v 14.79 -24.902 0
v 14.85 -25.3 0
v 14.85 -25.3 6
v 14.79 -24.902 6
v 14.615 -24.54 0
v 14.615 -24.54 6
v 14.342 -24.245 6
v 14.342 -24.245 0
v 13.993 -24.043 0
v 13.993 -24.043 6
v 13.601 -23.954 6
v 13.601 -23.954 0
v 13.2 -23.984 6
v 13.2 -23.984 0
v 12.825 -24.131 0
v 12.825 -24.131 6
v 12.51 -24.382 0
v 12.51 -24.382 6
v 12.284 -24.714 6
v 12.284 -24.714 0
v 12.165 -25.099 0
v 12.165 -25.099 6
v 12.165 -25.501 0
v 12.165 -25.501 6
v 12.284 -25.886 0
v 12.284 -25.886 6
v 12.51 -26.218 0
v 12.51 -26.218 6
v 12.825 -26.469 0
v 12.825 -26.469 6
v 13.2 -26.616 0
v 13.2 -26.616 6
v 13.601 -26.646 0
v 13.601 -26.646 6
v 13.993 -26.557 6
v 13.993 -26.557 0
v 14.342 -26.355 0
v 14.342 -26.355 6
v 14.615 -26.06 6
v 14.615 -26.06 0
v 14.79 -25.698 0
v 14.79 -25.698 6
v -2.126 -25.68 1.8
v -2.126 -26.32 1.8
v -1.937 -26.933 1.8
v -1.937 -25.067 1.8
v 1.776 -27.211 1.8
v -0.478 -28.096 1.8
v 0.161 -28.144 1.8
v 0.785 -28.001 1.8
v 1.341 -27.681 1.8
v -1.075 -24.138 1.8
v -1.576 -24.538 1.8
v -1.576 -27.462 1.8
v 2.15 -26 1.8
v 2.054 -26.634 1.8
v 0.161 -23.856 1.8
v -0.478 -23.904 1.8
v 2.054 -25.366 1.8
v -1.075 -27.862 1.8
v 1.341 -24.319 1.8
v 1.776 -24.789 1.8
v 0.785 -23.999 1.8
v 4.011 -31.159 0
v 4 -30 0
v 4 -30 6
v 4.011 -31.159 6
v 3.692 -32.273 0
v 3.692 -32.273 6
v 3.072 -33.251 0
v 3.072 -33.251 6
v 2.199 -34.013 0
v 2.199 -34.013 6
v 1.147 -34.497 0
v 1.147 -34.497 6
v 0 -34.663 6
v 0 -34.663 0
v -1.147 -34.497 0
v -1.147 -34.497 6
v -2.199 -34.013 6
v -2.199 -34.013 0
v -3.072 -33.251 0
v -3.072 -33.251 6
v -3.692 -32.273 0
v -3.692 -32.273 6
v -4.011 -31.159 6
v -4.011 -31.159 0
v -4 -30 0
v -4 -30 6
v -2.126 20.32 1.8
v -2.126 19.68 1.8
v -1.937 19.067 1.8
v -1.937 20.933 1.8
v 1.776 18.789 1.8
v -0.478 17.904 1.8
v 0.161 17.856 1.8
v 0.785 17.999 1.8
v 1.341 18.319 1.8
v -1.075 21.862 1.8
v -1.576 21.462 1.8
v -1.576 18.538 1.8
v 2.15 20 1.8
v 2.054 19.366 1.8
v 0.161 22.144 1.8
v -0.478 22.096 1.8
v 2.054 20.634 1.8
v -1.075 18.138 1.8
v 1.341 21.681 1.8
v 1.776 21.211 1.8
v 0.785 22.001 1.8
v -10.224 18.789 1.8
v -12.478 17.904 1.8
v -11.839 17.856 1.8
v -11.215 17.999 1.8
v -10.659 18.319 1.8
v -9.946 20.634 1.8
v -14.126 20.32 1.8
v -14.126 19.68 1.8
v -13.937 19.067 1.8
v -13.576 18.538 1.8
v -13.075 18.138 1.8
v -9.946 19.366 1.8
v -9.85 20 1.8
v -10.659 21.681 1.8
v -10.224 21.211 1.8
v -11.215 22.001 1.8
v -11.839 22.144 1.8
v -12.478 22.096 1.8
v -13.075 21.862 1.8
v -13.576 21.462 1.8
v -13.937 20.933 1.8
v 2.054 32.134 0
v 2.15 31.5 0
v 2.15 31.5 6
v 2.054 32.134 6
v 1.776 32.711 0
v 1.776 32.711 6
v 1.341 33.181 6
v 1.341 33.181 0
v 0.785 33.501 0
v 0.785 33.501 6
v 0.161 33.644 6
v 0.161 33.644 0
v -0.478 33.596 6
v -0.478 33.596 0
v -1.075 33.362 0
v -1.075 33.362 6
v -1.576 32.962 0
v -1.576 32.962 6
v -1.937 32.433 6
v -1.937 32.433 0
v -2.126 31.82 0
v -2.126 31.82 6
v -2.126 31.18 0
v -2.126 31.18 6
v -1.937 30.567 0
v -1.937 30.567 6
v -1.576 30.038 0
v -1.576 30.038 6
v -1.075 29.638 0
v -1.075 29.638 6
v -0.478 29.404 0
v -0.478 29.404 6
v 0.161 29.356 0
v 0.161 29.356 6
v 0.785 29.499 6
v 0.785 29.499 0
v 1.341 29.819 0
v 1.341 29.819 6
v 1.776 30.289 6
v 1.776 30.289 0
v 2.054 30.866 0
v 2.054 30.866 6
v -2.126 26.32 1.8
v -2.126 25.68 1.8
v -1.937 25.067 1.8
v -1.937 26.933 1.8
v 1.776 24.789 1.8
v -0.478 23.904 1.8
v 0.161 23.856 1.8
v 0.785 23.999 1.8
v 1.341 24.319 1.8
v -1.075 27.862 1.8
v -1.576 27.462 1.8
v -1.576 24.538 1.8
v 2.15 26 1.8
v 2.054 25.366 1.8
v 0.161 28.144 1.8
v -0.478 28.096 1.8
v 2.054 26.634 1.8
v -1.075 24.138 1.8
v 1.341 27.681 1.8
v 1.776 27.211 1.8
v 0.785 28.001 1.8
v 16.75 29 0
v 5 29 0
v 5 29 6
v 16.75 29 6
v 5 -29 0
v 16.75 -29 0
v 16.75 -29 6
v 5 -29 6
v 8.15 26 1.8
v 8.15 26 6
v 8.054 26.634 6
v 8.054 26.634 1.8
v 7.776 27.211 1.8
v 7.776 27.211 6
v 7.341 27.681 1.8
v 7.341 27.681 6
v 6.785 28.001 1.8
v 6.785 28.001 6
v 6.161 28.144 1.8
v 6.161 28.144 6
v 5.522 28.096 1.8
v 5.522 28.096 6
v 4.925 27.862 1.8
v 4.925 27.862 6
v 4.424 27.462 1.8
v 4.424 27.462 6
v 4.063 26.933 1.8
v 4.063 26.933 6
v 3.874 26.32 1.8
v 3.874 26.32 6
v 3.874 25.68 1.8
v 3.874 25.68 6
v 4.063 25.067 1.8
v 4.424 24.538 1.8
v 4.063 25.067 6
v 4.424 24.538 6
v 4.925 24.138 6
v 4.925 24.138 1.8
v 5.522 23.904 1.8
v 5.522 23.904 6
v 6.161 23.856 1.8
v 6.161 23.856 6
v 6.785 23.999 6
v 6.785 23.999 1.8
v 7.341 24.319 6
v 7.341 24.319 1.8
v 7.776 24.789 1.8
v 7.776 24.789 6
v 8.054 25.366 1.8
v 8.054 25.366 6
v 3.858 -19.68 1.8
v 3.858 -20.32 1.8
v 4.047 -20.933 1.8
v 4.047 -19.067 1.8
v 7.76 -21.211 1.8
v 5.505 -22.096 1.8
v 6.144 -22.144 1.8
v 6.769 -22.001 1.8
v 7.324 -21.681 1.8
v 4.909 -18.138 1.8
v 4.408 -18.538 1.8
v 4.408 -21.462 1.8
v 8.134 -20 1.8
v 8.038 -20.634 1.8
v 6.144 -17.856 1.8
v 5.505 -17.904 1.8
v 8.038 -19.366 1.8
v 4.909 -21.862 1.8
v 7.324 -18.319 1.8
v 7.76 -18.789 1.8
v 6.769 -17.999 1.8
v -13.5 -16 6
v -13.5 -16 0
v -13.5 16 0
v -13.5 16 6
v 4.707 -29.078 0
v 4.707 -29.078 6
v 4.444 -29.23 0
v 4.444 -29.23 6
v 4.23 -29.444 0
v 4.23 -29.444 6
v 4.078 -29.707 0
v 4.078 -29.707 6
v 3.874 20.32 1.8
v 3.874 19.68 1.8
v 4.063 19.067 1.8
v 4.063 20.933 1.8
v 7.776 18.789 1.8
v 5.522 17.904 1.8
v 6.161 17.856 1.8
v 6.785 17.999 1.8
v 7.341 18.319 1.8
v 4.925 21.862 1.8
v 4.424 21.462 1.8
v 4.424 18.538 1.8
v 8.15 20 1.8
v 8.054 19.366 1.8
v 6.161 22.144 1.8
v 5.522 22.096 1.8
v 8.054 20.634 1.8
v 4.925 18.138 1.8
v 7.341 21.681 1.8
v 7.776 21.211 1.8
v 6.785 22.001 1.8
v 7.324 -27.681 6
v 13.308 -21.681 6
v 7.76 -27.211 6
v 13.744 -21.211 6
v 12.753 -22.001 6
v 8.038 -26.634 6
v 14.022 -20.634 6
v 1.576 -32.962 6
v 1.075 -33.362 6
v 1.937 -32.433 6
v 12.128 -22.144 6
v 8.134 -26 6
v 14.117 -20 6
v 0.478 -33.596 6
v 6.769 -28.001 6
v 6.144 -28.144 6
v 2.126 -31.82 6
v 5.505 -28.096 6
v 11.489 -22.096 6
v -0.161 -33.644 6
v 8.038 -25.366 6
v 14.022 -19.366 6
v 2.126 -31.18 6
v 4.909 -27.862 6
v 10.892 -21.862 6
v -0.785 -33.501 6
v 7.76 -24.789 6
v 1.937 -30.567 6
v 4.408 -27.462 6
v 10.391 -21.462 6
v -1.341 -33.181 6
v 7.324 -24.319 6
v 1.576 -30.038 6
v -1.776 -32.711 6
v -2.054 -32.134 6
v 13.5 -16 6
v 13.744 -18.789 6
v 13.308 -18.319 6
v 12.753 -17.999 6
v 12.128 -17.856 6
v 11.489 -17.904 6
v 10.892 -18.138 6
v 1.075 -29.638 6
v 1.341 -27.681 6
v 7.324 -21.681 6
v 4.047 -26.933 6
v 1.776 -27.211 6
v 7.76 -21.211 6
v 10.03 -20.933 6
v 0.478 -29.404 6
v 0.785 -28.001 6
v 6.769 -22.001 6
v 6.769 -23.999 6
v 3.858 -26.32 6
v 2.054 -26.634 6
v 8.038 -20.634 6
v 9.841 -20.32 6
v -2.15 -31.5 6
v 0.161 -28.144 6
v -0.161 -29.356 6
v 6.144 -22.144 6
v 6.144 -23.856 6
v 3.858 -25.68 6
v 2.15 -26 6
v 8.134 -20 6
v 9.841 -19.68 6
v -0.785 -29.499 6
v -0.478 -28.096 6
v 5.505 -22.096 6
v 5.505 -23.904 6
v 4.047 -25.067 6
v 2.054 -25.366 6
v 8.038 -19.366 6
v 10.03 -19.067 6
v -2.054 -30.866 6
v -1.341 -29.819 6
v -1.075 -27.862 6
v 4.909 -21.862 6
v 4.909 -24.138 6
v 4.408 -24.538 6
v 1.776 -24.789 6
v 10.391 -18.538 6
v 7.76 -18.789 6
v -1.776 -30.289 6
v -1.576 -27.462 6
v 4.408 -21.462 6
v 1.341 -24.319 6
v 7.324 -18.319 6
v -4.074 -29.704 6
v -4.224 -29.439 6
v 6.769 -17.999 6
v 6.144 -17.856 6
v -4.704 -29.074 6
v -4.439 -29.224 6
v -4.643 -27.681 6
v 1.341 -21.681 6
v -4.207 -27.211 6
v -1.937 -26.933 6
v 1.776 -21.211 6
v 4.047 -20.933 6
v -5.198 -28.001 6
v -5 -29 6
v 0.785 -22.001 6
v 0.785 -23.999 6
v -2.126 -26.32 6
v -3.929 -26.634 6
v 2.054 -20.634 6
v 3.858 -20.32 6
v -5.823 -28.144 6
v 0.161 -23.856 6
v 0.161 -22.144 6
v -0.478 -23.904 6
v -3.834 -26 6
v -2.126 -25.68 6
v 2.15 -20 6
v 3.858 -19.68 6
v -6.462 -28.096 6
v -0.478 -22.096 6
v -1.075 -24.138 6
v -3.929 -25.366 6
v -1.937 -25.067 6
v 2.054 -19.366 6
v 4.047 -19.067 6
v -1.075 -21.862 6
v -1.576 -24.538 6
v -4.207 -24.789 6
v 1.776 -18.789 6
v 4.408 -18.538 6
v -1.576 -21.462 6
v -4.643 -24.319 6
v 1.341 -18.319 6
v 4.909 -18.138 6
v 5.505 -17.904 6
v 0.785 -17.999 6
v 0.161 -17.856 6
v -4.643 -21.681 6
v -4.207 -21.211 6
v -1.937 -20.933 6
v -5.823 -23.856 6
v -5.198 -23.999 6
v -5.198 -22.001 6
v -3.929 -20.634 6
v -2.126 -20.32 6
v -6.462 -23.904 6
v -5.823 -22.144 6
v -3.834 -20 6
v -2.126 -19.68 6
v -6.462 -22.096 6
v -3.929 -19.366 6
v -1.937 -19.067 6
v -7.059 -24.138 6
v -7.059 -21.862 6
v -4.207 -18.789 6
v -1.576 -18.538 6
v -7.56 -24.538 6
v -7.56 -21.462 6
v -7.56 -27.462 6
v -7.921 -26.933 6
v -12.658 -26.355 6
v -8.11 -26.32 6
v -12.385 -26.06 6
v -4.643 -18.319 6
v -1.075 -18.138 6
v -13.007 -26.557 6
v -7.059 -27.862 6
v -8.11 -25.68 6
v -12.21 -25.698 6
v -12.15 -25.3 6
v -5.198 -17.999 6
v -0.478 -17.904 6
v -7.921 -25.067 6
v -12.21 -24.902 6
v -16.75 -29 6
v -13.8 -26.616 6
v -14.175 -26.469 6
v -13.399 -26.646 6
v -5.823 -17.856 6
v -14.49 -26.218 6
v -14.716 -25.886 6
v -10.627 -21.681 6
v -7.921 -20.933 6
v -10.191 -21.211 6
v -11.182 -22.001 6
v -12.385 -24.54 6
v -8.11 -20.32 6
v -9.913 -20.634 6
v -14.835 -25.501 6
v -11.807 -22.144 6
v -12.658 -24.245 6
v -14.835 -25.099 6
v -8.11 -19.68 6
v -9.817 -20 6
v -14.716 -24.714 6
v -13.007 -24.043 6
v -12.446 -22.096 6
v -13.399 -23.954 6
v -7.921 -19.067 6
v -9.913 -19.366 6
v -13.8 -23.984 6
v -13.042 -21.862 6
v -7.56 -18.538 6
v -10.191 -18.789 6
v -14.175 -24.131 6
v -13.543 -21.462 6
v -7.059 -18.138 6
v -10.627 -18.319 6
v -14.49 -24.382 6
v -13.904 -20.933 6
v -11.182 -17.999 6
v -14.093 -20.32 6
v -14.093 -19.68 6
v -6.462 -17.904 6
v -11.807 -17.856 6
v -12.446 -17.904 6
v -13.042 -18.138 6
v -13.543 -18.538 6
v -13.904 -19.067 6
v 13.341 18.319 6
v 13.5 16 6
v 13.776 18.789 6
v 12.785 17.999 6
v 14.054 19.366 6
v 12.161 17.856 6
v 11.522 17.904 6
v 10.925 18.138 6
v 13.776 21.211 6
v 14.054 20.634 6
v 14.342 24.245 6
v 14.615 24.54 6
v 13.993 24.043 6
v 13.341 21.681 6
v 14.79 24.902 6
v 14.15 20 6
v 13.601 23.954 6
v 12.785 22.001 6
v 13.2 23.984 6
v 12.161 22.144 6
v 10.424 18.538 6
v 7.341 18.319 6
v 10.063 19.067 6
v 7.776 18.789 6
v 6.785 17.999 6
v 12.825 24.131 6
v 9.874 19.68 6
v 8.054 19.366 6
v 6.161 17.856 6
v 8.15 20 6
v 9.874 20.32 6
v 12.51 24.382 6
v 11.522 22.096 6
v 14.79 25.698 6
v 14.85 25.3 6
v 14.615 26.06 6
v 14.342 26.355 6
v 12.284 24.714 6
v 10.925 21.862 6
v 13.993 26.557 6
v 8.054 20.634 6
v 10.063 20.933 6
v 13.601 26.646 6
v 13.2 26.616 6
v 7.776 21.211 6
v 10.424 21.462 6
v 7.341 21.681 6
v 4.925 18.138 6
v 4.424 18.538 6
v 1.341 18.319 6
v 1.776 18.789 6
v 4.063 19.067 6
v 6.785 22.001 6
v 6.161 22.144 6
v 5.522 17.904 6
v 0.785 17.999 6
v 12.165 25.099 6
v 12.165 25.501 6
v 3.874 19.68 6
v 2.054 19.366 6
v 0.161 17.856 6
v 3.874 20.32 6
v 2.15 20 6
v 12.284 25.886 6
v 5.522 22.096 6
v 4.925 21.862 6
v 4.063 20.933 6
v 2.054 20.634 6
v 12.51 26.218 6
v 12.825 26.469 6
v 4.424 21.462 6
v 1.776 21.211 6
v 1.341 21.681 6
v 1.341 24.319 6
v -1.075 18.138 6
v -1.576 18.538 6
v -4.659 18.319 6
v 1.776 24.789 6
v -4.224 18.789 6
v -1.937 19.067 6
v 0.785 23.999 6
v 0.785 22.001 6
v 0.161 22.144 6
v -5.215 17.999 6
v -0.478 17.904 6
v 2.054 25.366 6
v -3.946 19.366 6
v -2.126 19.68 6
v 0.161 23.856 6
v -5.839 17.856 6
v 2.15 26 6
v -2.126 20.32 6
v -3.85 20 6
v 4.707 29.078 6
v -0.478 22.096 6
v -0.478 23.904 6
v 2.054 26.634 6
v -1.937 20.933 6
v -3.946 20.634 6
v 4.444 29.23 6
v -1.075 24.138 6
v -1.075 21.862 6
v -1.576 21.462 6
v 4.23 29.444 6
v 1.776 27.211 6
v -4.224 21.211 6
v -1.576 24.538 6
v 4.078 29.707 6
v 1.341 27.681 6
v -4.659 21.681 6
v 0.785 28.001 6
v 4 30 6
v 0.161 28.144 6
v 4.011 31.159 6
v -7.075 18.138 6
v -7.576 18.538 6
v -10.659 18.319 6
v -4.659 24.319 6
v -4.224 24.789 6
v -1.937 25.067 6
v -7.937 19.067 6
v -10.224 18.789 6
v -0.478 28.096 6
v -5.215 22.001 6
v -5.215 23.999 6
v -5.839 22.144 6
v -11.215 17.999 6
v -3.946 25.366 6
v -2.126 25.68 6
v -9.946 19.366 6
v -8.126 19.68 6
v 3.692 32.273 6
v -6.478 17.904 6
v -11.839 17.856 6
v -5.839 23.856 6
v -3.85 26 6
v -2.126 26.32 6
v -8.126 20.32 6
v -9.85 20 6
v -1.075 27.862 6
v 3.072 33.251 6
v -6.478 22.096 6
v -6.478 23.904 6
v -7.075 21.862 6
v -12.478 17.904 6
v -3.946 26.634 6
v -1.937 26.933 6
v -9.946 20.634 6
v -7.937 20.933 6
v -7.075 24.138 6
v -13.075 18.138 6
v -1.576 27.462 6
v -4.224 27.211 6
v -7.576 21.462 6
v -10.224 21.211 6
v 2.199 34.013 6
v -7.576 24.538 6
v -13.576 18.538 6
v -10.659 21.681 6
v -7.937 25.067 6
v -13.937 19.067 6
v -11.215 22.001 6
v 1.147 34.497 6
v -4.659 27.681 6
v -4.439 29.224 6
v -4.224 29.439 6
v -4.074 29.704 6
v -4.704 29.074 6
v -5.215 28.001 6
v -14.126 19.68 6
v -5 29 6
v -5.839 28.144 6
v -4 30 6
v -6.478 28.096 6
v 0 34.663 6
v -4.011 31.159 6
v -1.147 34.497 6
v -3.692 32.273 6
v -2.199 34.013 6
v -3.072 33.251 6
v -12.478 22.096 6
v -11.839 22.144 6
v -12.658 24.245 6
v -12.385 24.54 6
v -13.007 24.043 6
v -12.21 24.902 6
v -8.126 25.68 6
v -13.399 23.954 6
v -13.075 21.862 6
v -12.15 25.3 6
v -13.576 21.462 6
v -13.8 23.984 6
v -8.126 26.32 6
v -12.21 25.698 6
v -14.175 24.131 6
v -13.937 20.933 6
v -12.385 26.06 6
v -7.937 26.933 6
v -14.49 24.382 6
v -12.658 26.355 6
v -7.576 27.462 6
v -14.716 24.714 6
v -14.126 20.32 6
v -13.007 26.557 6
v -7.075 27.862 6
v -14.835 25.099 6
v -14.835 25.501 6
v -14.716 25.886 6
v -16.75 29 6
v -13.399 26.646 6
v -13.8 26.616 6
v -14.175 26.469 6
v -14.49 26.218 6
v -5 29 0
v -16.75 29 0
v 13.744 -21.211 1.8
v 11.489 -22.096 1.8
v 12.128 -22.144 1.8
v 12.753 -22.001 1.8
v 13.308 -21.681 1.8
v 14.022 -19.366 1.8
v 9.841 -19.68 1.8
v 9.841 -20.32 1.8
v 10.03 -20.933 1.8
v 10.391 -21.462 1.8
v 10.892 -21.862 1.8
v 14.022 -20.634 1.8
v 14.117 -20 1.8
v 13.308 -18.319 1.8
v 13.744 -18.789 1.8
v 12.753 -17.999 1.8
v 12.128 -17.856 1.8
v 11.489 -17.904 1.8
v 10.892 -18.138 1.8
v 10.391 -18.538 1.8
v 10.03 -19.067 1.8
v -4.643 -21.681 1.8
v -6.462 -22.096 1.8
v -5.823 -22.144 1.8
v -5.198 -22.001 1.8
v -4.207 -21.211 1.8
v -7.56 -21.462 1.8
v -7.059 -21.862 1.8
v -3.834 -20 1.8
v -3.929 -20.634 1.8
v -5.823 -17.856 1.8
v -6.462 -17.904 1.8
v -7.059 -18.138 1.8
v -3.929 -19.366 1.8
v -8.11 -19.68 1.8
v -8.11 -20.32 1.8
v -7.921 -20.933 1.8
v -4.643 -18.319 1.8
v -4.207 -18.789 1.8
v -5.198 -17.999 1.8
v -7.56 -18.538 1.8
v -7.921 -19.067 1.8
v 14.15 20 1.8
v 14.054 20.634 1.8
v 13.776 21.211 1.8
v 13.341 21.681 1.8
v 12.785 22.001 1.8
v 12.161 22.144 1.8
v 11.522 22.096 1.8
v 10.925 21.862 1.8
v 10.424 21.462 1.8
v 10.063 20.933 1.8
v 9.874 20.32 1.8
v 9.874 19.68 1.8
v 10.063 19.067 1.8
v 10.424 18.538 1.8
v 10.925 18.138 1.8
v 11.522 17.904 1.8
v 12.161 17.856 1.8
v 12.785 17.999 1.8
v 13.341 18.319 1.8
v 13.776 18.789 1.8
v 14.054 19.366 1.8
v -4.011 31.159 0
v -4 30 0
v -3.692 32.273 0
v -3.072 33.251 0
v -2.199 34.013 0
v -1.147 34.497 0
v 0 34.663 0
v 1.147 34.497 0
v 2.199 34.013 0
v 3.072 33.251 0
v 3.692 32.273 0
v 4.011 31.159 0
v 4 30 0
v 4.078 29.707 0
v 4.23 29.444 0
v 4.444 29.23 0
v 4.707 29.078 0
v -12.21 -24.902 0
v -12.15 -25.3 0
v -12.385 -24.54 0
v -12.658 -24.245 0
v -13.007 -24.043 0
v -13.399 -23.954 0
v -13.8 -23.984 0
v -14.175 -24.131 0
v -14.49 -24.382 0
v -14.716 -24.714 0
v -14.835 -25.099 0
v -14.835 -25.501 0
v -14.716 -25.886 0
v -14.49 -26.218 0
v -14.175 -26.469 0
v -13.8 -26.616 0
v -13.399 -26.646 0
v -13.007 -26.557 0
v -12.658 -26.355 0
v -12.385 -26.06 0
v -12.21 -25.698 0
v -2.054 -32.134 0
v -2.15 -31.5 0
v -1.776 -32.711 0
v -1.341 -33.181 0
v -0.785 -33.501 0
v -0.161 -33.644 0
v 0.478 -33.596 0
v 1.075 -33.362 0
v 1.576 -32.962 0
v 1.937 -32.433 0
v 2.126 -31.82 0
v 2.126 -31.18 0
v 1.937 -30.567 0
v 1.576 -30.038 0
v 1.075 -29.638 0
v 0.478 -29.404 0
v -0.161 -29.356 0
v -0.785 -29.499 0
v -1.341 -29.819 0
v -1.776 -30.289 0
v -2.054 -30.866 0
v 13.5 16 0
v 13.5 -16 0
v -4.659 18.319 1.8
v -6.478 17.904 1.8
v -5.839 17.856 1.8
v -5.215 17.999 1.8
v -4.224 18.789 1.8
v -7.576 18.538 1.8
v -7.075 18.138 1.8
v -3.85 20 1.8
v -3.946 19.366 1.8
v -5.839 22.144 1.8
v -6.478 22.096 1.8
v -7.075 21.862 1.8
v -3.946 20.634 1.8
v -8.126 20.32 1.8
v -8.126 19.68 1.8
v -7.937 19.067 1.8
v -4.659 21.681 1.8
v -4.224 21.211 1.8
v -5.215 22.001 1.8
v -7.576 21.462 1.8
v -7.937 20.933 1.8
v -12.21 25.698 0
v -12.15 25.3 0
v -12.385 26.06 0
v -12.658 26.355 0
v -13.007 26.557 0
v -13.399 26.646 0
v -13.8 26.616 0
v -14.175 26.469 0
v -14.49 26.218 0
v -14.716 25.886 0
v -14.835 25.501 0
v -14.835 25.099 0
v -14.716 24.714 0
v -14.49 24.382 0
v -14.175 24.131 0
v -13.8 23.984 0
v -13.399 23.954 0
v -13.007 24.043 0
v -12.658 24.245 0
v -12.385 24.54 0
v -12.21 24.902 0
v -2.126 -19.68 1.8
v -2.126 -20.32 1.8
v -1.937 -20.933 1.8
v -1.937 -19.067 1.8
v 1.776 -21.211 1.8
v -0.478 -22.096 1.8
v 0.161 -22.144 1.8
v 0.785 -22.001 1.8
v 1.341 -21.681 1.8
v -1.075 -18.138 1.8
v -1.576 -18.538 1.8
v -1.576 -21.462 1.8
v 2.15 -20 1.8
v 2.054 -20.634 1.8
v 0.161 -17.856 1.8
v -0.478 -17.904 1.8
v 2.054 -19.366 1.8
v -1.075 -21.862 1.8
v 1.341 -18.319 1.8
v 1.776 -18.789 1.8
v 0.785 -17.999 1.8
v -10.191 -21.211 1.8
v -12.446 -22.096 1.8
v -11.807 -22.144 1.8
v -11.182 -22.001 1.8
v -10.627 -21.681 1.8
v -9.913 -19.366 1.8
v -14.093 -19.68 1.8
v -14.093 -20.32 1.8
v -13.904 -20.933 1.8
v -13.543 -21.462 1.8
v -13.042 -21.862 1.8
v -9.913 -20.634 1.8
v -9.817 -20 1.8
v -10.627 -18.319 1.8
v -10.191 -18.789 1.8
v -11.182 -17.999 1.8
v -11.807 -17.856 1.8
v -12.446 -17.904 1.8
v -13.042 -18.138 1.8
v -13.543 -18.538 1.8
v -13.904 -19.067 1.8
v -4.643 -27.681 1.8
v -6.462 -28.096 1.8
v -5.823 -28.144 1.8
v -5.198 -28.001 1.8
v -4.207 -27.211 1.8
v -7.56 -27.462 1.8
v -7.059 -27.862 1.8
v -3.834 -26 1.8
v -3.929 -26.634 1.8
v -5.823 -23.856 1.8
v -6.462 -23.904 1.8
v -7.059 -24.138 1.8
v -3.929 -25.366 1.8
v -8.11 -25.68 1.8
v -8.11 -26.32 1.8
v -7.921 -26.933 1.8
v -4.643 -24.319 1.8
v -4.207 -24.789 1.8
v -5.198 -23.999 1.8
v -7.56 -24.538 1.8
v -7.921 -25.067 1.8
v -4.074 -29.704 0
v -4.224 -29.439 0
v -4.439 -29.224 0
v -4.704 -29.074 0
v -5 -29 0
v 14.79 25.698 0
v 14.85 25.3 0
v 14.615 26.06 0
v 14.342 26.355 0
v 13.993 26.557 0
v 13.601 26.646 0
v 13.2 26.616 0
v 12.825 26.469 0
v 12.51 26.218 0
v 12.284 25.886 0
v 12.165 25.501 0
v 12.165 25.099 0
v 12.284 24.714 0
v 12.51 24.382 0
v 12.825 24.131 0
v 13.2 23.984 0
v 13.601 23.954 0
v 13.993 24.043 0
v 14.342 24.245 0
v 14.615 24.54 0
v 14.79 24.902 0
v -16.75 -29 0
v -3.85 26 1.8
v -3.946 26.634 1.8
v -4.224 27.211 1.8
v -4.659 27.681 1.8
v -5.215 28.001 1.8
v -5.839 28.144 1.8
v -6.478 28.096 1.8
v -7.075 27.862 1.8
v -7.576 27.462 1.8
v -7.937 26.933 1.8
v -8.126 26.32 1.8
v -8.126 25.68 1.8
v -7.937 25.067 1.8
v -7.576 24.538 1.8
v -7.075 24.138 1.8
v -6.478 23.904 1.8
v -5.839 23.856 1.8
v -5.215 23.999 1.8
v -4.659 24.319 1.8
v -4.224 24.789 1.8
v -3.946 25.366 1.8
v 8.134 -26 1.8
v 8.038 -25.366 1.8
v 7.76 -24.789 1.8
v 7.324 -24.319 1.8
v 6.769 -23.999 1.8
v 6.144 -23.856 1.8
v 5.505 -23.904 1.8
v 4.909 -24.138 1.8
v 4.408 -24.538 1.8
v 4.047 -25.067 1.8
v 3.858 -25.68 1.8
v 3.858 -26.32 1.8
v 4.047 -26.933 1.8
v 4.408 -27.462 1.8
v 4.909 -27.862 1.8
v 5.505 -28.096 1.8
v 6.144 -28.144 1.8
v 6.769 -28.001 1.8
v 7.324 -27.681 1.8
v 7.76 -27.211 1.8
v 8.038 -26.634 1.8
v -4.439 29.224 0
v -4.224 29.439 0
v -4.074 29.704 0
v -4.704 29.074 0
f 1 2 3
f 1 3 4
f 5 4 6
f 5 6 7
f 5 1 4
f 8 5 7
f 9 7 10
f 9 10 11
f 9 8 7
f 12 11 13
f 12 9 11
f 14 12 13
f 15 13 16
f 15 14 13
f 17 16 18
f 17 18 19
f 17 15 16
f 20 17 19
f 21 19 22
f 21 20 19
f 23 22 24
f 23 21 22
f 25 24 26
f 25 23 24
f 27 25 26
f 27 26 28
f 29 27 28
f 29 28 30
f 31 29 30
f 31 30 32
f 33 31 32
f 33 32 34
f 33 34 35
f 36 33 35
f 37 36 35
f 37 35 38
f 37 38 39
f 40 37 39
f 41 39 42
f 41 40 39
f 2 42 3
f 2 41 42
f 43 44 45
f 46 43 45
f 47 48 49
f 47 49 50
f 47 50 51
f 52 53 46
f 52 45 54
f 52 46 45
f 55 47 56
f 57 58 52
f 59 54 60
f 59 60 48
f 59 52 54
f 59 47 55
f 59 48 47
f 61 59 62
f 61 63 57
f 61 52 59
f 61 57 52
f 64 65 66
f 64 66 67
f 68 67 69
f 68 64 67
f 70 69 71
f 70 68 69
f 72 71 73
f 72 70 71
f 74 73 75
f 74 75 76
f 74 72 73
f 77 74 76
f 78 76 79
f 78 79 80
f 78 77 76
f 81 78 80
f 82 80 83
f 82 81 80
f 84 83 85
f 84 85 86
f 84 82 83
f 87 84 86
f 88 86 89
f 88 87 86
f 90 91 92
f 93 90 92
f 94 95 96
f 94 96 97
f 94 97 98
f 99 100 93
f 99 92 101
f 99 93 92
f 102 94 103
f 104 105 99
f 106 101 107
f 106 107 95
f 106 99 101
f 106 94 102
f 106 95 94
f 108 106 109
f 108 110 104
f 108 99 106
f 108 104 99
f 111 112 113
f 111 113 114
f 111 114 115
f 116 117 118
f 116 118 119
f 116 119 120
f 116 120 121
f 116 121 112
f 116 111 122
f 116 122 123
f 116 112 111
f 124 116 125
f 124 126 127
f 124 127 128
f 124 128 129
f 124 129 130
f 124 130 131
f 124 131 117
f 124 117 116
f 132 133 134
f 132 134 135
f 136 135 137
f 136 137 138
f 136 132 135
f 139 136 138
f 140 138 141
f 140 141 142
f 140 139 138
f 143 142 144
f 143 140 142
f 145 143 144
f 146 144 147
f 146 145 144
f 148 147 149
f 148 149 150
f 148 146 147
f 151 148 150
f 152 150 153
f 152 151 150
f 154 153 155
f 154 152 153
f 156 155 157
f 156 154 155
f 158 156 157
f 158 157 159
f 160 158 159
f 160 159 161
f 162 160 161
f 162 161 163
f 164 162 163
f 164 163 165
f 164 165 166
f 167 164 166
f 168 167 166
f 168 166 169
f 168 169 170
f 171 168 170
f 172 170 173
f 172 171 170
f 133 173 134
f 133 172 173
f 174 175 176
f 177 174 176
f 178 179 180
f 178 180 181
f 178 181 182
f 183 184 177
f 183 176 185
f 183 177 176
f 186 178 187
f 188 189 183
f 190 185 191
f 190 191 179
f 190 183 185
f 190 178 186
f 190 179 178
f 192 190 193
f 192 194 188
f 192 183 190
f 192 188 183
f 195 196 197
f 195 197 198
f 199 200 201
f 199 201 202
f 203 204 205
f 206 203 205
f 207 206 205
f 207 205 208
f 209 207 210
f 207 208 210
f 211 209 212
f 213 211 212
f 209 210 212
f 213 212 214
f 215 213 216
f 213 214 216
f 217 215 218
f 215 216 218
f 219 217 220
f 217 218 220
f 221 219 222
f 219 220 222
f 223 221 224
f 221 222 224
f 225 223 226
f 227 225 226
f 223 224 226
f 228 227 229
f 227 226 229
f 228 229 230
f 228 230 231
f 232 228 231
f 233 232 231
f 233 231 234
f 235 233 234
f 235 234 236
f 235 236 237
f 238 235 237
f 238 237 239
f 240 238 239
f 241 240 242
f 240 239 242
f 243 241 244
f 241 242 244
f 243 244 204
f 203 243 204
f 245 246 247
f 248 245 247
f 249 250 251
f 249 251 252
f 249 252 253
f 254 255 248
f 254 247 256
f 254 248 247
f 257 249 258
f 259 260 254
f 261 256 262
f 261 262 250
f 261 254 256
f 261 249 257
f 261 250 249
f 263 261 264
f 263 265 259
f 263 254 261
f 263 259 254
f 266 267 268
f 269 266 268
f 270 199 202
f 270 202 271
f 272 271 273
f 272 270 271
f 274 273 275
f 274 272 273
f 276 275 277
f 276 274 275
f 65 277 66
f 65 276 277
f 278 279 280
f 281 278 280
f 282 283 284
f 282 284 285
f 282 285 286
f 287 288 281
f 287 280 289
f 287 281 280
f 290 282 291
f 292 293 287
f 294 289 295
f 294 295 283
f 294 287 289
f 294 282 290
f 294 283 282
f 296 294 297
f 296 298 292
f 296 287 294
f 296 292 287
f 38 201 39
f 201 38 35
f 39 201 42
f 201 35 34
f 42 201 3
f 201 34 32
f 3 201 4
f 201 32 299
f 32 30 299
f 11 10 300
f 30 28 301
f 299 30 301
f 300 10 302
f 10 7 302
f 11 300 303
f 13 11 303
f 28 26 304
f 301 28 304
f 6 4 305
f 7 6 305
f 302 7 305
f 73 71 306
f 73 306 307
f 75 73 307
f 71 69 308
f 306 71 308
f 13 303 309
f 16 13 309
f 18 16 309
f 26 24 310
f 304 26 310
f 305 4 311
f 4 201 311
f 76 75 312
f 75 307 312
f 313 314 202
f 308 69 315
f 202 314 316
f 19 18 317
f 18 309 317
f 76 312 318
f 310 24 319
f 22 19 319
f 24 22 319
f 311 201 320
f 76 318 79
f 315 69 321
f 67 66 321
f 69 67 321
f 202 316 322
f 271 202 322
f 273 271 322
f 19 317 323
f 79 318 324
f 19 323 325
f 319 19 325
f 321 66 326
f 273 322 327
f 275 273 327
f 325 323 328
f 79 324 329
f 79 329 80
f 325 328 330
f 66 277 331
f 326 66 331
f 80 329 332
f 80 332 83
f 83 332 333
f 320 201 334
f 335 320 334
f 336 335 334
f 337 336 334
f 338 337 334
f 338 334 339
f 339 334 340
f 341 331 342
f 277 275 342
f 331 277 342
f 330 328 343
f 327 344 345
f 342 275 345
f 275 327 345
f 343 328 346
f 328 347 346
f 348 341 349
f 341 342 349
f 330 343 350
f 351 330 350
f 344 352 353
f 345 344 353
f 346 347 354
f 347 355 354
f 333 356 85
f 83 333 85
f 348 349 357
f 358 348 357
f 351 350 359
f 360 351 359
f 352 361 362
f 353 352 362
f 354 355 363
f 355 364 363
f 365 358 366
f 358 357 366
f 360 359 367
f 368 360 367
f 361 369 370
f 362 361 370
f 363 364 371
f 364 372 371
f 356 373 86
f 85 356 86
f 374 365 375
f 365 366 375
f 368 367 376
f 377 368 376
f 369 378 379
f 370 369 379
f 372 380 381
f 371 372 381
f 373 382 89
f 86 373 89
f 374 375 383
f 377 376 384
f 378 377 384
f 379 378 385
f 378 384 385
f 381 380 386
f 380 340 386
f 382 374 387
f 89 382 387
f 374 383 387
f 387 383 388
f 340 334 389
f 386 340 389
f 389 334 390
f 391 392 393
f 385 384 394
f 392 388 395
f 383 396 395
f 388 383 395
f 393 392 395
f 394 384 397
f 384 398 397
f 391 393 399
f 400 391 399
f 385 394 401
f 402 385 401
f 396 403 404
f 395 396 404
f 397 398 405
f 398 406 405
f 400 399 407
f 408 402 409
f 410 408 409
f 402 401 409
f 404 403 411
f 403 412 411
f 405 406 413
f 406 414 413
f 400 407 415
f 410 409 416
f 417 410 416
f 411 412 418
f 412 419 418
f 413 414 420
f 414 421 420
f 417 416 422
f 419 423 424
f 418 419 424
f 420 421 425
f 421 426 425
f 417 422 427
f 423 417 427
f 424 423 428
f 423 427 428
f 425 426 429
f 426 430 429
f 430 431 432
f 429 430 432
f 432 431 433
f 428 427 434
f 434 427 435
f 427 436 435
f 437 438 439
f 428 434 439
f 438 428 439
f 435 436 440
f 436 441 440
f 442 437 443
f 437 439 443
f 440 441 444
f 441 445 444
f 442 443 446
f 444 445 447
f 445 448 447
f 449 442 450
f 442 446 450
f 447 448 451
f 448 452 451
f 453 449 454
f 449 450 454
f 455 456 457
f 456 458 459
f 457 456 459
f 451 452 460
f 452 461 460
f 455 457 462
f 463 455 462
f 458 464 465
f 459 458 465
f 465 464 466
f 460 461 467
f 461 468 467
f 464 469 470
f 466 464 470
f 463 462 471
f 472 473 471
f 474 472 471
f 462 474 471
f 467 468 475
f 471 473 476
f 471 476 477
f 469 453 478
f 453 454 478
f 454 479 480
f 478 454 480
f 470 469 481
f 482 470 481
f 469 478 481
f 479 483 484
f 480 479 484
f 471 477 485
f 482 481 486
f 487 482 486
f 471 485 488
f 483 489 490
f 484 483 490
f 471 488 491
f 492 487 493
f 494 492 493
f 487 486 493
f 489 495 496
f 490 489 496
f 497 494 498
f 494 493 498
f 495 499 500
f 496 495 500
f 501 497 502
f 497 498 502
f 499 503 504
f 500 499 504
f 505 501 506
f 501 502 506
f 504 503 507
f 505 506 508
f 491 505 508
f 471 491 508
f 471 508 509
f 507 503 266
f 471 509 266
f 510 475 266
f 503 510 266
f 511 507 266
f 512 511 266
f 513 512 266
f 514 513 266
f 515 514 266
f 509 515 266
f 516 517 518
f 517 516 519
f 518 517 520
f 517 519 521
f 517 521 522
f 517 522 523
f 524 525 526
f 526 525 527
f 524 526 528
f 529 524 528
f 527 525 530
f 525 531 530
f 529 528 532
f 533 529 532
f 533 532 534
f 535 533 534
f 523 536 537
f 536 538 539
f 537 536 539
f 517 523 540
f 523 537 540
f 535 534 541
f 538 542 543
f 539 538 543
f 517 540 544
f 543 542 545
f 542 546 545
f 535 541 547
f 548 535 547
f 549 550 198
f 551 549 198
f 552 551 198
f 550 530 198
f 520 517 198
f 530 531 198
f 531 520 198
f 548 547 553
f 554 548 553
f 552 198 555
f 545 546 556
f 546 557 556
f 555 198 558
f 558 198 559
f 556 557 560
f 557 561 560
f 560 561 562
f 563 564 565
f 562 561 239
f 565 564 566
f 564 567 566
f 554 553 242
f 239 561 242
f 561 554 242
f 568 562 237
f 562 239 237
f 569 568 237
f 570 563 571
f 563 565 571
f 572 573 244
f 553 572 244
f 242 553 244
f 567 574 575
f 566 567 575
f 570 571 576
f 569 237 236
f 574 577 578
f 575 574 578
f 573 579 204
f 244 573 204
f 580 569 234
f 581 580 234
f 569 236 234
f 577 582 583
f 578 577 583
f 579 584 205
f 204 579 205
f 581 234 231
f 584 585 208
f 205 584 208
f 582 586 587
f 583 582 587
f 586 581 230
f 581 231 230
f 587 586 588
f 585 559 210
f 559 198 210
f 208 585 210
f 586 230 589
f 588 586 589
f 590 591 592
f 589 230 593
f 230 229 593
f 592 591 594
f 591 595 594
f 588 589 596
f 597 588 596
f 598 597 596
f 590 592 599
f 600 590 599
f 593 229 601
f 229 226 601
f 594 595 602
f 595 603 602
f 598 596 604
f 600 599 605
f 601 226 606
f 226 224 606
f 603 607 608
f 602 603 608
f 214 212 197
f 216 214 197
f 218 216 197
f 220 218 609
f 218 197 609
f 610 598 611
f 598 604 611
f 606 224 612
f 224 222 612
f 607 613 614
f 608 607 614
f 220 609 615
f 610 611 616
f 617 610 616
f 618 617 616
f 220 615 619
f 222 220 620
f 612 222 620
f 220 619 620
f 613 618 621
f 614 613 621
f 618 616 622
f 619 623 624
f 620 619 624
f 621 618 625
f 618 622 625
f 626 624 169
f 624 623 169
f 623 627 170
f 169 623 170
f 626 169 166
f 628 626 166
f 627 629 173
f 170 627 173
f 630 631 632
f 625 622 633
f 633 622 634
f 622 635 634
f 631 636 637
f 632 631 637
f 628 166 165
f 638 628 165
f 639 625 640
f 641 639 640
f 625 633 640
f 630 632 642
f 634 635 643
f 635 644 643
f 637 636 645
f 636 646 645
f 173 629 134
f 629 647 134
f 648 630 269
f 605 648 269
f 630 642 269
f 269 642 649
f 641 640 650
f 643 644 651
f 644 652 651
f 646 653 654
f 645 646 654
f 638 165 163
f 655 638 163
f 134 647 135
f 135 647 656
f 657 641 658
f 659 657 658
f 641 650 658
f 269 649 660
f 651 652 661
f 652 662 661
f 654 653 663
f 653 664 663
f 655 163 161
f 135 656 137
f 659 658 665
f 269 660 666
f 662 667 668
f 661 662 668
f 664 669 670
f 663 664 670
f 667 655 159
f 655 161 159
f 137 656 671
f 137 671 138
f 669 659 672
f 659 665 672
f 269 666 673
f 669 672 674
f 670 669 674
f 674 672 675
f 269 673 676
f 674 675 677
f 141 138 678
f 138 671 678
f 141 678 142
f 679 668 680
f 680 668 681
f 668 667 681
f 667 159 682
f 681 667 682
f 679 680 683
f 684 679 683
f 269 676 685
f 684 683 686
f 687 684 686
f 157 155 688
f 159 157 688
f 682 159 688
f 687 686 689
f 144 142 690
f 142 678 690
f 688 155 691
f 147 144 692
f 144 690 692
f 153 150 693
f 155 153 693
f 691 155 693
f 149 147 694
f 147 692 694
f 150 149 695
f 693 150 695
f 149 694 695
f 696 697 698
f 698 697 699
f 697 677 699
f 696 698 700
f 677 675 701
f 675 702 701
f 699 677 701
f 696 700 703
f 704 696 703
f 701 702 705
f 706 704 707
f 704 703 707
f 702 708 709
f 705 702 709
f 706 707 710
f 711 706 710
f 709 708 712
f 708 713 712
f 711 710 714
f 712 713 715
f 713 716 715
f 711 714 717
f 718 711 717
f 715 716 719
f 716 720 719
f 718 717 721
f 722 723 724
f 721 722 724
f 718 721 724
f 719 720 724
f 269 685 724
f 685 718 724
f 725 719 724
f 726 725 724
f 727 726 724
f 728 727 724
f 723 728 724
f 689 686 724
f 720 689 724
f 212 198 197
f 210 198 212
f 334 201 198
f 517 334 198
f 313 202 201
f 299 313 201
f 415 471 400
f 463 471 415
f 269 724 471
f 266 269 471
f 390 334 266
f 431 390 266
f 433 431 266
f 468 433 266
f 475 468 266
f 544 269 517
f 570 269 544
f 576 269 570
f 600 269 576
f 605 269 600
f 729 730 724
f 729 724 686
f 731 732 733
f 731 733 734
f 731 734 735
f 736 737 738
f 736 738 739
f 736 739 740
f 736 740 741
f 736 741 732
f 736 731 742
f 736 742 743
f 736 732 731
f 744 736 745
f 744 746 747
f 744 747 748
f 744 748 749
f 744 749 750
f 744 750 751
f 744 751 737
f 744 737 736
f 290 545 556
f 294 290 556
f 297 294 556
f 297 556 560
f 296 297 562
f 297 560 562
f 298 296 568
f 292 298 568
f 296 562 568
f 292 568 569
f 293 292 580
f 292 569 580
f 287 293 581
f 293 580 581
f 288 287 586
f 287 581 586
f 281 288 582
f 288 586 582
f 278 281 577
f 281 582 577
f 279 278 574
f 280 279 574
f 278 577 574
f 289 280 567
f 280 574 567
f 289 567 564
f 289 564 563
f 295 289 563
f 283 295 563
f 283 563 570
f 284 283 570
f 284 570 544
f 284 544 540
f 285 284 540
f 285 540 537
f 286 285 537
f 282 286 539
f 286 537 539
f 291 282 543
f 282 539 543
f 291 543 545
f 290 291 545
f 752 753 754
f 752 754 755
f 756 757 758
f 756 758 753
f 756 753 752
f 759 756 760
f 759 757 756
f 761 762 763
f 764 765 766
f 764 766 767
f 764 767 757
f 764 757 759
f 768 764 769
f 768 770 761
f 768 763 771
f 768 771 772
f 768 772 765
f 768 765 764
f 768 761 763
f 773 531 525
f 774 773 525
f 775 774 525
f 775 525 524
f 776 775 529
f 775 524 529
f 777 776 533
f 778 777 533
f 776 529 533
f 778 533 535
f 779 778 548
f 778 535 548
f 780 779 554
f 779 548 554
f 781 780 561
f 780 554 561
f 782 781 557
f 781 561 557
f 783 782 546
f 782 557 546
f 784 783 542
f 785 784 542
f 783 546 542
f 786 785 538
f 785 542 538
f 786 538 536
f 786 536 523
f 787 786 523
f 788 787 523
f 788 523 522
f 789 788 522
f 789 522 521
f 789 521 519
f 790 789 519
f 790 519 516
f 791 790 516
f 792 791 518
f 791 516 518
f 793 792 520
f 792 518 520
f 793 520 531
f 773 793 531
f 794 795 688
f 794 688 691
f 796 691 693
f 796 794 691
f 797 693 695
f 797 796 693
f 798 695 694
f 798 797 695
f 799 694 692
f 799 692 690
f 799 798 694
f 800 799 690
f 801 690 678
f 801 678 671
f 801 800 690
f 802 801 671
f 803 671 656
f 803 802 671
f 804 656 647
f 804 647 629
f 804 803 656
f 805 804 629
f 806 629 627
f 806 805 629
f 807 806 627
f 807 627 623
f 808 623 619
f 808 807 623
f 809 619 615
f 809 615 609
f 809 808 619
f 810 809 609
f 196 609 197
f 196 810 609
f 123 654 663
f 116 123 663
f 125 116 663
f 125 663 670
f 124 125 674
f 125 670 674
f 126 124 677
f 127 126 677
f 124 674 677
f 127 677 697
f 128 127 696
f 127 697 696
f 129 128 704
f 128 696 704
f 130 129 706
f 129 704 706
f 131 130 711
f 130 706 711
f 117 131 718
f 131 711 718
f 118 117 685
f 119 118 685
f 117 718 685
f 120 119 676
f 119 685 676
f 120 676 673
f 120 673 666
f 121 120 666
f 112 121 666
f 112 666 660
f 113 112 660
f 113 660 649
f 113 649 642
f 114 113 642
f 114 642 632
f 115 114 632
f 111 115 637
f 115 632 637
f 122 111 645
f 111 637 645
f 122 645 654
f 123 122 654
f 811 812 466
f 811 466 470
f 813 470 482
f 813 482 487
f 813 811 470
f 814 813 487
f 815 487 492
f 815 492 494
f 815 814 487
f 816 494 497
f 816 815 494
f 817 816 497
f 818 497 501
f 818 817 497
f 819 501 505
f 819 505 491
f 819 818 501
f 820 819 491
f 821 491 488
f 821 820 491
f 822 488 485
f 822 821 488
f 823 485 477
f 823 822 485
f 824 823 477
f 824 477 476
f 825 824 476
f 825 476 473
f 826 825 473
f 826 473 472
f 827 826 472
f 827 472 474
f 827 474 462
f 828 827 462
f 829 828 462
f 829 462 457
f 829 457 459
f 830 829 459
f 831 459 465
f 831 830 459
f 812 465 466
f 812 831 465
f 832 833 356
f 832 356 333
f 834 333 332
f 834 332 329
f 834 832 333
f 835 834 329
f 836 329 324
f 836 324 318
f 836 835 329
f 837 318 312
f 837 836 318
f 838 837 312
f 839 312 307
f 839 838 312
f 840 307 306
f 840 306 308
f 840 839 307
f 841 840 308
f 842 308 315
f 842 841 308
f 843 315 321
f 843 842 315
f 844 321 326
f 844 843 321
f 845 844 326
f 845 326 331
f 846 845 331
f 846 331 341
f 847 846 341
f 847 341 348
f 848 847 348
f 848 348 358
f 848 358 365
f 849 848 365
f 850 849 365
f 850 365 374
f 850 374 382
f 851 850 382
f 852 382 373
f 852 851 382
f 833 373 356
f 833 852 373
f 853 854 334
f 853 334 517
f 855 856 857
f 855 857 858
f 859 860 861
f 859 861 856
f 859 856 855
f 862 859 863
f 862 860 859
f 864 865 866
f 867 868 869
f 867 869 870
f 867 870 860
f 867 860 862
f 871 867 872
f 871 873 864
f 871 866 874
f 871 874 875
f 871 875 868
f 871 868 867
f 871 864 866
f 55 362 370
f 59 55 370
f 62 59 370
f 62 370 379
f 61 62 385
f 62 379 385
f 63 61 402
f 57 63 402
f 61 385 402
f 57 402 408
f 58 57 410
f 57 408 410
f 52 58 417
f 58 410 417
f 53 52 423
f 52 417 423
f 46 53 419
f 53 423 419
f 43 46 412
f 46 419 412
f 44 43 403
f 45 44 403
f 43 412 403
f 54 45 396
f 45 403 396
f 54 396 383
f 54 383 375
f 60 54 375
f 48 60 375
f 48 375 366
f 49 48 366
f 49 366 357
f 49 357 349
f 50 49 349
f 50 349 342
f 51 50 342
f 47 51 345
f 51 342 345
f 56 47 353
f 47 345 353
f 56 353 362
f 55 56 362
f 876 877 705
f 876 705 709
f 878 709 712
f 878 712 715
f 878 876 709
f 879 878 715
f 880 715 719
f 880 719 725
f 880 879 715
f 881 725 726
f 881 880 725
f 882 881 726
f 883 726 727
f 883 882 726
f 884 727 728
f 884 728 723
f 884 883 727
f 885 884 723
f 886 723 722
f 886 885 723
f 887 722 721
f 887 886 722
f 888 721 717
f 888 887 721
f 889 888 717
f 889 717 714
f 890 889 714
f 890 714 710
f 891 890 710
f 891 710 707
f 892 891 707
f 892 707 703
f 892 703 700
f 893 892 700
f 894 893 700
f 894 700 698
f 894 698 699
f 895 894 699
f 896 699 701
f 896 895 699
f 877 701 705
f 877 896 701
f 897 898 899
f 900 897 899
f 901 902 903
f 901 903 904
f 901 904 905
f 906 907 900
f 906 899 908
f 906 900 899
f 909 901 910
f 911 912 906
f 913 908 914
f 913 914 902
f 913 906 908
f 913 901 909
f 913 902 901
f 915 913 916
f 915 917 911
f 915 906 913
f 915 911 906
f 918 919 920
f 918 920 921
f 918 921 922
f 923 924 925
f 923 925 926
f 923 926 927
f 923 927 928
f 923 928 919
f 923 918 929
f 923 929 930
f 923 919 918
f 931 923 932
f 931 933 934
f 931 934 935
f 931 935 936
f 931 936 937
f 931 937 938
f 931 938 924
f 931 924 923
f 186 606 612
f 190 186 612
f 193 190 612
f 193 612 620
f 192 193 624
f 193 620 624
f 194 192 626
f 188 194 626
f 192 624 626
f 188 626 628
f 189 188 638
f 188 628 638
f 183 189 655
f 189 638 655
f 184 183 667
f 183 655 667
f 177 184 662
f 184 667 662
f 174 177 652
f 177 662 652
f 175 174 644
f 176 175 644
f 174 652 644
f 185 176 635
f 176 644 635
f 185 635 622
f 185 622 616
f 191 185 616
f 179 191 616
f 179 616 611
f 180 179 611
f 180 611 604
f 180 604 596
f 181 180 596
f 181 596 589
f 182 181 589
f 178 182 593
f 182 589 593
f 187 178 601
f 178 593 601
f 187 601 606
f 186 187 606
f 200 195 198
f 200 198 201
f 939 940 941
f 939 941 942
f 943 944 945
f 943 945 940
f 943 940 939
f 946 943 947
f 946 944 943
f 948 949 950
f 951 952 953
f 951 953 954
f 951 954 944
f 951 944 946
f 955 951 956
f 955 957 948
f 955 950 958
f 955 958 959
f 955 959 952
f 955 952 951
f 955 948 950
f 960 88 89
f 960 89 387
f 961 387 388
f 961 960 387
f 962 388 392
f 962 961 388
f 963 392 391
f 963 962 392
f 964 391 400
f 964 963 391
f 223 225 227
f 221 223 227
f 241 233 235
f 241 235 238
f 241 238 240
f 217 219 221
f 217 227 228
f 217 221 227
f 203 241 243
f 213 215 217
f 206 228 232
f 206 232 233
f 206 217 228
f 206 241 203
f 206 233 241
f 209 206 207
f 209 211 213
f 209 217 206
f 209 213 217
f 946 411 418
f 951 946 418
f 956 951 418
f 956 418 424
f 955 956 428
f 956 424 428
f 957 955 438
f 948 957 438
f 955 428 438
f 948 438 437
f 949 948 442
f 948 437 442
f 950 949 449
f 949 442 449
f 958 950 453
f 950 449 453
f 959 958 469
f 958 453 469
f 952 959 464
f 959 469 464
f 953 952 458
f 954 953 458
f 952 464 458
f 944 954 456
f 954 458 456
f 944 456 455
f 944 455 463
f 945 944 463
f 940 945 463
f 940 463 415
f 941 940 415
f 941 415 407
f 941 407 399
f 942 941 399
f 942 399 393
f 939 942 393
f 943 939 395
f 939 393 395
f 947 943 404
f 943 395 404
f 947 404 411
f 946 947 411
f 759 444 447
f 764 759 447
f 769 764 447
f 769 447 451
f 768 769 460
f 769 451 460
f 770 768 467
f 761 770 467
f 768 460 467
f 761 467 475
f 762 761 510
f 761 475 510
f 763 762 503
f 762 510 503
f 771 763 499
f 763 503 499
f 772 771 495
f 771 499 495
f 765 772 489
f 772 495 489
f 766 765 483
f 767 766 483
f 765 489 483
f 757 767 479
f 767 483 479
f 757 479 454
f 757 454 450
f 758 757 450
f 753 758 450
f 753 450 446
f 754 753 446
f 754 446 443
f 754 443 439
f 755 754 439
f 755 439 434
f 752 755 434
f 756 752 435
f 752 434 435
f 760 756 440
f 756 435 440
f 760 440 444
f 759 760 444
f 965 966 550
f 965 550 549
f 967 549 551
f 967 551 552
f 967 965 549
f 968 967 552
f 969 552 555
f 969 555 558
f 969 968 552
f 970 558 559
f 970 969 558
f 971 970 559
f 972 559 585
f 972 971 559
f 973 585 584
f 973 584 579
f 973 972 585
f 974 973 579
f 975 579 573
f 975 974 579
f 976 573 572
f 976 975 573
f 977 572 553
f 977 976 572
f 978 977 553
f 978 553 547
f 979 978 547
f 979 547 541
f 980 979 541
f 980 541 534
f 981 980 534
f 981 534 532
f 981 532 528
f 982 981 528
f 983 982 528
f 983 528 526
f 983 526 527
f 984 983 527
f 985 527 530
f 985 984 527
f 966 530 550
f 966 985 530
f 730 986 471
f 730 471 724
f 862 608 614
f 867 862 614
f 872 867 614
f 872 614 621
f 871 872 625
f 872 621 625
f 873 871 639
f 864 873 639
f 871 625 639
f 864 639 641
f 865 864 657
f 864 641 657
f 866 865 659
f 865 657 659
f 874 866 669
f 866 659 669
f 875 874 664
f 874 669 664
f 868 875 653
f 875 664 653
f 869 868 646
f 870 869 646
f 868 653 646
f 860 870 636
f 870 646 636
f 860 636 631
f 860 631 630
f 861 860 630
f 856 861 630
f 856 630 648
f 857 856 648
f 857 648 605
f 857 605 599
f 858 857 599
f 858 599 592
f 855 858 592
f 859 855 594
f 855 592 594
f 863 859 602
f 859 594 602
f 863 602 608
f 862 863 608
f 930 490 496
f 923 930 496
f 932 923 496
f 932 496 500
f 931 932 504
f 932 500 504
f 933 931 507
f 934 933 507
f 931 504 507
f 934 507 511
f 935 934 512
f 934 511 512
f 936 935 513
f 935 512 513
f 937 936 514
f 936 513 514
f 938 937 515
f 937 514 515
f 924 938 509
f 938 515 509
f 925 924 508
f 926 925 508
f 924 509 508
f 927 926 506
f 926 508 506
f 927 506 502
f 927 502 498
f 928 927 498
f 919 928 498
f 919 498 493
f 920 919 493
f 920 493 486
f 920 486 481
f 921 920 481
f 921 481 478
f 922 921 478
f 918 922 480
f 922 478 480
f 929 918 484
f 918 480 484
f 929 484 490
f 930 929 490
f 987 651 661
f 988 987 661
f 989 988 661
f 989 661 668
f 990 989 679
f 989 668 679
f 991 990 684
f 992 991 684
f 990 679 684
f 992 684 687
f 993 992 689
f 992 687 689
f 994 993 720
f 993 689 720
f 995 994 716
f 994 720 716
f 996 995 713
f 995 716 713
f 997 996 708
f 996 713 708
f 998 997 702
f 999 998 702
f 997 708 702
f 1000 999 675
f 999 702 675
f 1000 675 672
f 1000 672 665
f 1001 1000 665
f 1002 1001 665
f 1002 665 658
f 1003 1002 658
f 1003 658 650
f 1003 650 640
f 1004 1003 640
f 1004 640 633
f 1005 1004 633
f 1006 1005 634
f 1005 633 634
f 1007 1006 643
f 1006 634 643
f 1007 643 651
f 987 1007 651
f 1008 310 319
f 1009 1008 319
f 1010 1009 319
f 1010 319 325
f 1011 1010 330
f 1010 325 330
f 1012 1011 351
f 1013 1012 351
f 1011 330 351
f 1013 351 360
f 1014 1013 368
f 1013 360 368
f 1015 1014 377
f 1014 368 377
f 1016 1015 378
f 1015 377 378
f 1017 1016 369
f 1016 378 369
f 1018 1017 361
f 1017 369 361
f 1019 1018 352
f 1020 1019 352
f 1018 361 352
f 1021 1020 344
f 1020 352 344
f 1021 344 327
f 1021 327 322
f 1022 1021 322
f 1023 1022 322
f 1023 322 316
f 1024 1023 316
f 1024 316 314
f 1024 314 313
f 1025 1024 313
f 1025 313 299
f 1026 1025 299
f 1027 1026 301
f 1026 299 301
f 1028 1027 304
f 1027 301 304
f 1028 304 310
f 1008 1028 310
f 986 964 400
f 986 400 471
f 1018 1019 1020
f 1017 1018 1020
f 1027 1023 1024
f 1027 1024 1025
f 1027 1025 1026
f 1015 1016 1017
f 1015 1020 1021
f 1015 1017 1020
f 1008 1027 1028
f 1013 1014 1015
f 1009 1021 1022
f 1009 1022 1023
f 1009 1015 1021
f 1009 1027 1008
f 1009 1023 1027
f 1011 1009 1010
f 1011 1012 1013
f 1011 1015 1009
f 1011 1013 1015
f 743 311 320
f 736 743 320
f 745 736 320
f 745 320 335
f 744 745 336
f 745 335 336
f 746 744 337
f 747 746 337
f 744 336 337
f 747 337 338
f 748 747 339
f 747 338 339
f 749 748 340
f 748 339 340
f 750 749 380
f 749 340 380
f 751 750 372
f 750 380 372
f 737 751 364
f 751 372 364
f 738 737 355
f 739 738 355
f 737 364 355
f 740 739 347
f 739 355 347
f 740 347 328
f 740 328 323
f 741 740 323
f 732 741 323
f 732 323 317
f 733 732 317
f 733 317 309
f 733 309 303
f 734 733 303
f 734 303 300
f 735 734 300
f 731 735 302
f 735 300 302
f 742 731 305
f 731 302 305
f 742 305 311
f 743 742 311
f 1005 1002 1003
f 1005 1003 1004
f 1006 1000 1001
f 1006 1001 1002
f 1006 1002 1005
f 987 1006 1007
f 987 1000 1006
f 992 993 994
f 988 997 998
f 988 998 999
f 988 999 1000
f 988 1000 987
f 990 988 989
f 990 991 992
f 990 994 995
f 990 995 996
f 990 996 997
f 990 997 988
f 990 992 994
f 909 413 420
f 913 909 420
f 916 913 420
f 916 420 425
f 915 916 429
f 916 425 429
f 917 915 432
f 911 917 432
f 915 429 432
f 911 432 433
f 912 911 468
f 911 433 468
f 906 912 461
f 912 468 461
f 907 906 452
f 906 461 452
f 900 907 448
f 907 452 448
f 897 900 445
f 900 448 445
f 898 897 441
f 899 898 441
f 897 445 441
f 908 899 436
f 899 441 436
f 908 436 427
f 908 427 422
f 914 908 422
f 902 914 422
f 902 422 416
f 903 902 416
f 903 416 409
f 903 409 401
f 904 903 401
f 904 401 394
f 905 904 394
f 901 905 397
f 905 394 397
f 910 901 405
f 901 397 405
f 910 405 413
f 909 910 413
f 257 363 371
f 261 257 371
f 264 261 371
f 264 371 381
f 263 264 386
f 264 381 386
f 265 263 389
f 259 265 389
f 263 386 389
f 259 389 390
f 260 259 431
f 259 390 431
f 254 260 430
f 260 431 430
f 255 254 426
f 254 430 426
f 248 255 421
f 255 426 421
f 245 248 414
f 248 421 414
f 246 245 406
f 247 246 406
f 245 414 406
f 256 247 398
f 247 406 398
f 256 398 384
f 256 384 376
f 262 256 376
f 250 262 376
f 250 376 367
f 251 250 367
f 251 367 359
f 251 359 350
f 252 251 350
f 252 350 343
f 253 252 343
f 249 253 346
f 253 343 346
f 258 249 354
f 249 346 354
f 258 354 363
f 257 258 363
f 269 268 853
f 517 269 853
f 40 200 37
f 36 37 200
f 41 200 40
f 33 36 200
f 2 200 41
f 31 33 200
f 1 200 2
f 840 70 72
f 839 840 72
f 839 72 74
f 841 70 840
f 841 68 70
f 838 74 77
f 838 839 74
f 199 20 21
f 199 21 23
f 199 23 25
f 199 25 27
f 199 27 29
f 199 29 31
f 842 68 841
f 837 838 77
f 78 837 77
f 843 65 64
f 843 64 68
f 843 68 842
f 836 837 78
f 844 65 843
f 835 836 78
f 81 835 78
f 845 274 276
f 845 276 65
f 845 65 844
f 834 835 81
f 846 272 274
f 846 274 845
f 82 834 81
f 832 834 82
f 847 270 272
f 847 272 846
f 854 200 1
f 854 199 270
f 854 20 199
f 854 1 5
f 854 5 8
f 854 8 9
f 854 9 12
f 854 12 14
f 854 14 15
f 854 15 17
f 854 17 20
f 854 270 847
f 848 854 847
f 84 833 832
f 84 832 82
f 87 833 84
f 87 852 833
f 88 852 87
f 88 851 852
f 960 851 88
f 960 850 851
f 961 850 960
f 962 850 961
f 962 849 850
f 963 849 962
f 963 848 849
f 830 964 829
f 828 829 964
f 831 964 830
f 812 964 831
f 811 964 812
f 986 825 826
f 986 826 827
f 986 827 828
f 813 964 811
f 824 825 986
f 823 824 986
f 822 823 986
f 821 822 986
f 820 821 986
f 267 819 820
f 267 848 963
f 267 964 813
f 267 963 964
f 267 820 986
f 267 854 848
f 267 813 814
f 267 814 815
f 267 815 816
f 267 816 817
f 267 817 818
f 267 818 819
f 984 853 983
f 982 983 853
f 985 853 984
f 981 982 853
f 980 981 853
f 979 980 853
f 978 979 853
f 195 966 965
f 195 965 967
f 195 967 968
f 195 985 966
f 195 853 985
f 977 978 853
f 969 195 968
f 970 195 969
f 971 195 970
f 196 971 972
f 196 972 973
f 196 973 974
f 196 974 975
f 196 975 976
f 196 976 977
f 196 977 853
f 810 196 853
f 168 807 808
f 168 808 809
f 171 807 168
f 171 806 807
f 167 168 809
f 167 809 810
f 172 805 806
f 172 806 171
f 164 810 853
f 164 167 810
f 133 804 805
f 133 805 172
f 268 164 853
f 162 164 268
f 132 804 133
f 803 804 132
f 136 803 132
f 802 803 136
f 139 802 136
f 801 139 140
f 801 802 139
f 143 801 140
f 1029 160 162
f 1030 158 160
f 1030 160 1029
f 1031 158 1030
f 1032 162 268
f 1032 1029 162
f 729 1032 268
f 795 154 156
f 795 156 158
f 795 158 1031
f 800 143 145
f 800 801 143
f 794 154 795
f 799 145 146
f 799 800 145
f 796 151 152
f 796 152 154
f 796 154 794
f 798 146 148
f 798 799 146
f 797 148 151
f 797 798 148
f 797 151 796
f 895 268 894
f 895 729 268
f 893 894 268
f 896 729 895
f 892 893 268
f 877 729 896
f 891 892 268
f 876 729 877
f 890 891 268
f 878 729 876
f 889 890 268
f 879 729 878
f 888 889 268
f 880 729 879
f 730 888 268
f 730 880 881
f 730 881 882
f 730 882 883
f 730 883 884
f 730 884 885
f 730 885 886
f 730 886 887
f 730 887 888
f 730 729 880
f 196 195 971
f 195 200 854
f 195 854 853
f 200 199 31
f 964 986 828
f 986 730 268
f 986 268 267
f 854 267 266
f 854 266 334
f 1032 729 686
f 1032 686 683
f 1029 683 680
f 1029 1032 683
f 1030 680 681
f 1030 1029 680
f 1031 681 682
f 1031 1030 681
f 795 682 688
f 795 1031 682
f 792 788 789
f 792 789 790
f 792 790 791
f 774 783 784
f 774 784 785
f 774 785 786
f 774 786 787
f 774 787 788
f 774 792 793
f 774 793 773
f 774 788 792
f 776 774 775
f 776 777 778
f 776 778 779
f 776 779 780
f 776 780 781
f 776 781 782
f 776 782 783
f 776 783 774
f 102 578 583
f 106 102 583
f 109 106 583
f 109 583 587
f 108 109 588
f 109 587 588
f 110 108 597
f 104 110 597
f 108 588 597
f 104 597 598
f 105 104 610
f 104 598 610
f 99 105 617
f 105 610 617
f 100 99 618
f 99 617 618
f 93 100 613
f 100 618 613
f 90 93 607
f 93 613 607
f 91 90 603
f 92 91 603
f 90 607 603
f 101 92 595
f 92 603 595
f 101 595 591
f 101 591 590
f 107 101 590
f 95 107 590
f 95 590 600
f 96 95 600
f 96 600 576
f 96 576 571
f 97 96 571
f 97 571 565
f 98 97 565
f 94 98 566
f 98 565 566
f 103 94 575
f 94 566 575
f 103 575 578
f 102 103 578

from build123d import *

# Parameters (mm, degrees)
SKETCH1_R           = 1.35
SKETCH1_R_2         = 2.15
SKETCH1_W           = 27
SKETCH1_H           = 32
BOSS_EXTRUDE1_DEPTH = 6
SKETCH2_R           = 2.15
CUT_EXTRUDE1_DEPTH  = 4.2


with BuildPart() as part:
    # Sketch1 → Boss-Extrude1 (new body)
    with BuildSketch(Plane.XY):
        with BuildLine():
            Line((-16.75, 29), (-5, 29))
            ThreePointArc((-5, 29), (-4.324155518, 29.324155518), (-4, 30))
            ThreePointArc((-4, 30), (0, 34.662885145), (4, 30))
            ThreePointArc((4, 30), (4.330169642, 29.330169642), (5, 29))
            Line((5, 29), (16.75, 29))
            Line((16.75, 29), (16.75, -29))
            Line((16.75, -29), (5, -29))
            ThreePointArc((5, -29), (4.330169642, -29.330169642), (4, -30))
            ThreePointArc((4, -30), (0, -34.662885145), (-4, -30))
            ThreePointArc((-4, -30), (-4.324155518, -29.324155518), (-5, -29))
            Line((-5, -29), (-16.75, -29))
            Line((-16.75, -29), (-16.75, 29))
        make_face()
        with Locations((-13.5, 25.3)):
            Circle(SKETCH1_R, mode=Mode.SUBTRACT)
        with Locations((13.5, -25.3)):
            Circle(SKETCH1_R, mode=Mode.SUBTRACT)
        with Locations((-13.5, -25.3)):
            Circle(SKETCH1_R, mode=Mode.SUBTRACT)
        with Locations((13.5, 25.3)):
            Circle(SKETCH1_R, mode=Mode.SUBTRACT)
        with Locations((0, 31.5)):
            Circle(SKETCH1_R_2, mode=Mode.SUBTRACT)
        with Locations(Location((0, -31.5, 0), (0, 0, 180))):
            Circle(SKETCH1_R_2, mode=Mode.SUBTRACT)
        Rectangle(SKETCH1_W, SKETCH1_H, mode=Mode.SUBTRACT)
    extrude(amount=BOSS_EXTRUDE1_DEPTH)

    # Sketch2 → Cut-Extrude1 (cut)
    with BuildSketch(Plane.XY.offset(6)):
        with Locations((-12, 20)):
            Circle(SKETCH2_R)
        with Locations((-6, 20)):
            Circle(SKETCH2_R)
        with Locations((0, 20)):
            Circle(SKETCH2_R)
        with Locations((6, 20)):
            Circle(SKETCH2_R)
        with Locations((12, 20)):
            Circle(SKETCH2_R)
        with Locations((-6, 26)):
            Circle(SKETCH2_R)
        with Locations((0, 26)):
            Circle(SKETCH2_R)
        with Locations((6, 26)):
            Circle(SKETCH2_R)
        with Locations((-11.967349369, -20)):
            Circle(SKETCH2_R)
        with Locations((-5.983674685, -20)):
            Circle(SKETCH2_R)
        with Locations((0, -20)):
            Circle(SKETCH2_R)
        with Locations((5.983674685, -20)):
            Circle(SKETCH2_R)
        with Locations((11.967349369, -20)):
            Circle(SKETCH2_R)
        with Locations((-5.983674685, -26)):
            Circle(SKETCH2_R)
        with Locations((0, -26)):
            Circle(SKETCH2_R)
        with Locations((5.983674685, -26)):
            Circle(SKETCH2_R)
    extrude(amount=-CUT_EXTRUDE1_DEPTH, mode=Mode.SUBTRACT)


solid = part.part
